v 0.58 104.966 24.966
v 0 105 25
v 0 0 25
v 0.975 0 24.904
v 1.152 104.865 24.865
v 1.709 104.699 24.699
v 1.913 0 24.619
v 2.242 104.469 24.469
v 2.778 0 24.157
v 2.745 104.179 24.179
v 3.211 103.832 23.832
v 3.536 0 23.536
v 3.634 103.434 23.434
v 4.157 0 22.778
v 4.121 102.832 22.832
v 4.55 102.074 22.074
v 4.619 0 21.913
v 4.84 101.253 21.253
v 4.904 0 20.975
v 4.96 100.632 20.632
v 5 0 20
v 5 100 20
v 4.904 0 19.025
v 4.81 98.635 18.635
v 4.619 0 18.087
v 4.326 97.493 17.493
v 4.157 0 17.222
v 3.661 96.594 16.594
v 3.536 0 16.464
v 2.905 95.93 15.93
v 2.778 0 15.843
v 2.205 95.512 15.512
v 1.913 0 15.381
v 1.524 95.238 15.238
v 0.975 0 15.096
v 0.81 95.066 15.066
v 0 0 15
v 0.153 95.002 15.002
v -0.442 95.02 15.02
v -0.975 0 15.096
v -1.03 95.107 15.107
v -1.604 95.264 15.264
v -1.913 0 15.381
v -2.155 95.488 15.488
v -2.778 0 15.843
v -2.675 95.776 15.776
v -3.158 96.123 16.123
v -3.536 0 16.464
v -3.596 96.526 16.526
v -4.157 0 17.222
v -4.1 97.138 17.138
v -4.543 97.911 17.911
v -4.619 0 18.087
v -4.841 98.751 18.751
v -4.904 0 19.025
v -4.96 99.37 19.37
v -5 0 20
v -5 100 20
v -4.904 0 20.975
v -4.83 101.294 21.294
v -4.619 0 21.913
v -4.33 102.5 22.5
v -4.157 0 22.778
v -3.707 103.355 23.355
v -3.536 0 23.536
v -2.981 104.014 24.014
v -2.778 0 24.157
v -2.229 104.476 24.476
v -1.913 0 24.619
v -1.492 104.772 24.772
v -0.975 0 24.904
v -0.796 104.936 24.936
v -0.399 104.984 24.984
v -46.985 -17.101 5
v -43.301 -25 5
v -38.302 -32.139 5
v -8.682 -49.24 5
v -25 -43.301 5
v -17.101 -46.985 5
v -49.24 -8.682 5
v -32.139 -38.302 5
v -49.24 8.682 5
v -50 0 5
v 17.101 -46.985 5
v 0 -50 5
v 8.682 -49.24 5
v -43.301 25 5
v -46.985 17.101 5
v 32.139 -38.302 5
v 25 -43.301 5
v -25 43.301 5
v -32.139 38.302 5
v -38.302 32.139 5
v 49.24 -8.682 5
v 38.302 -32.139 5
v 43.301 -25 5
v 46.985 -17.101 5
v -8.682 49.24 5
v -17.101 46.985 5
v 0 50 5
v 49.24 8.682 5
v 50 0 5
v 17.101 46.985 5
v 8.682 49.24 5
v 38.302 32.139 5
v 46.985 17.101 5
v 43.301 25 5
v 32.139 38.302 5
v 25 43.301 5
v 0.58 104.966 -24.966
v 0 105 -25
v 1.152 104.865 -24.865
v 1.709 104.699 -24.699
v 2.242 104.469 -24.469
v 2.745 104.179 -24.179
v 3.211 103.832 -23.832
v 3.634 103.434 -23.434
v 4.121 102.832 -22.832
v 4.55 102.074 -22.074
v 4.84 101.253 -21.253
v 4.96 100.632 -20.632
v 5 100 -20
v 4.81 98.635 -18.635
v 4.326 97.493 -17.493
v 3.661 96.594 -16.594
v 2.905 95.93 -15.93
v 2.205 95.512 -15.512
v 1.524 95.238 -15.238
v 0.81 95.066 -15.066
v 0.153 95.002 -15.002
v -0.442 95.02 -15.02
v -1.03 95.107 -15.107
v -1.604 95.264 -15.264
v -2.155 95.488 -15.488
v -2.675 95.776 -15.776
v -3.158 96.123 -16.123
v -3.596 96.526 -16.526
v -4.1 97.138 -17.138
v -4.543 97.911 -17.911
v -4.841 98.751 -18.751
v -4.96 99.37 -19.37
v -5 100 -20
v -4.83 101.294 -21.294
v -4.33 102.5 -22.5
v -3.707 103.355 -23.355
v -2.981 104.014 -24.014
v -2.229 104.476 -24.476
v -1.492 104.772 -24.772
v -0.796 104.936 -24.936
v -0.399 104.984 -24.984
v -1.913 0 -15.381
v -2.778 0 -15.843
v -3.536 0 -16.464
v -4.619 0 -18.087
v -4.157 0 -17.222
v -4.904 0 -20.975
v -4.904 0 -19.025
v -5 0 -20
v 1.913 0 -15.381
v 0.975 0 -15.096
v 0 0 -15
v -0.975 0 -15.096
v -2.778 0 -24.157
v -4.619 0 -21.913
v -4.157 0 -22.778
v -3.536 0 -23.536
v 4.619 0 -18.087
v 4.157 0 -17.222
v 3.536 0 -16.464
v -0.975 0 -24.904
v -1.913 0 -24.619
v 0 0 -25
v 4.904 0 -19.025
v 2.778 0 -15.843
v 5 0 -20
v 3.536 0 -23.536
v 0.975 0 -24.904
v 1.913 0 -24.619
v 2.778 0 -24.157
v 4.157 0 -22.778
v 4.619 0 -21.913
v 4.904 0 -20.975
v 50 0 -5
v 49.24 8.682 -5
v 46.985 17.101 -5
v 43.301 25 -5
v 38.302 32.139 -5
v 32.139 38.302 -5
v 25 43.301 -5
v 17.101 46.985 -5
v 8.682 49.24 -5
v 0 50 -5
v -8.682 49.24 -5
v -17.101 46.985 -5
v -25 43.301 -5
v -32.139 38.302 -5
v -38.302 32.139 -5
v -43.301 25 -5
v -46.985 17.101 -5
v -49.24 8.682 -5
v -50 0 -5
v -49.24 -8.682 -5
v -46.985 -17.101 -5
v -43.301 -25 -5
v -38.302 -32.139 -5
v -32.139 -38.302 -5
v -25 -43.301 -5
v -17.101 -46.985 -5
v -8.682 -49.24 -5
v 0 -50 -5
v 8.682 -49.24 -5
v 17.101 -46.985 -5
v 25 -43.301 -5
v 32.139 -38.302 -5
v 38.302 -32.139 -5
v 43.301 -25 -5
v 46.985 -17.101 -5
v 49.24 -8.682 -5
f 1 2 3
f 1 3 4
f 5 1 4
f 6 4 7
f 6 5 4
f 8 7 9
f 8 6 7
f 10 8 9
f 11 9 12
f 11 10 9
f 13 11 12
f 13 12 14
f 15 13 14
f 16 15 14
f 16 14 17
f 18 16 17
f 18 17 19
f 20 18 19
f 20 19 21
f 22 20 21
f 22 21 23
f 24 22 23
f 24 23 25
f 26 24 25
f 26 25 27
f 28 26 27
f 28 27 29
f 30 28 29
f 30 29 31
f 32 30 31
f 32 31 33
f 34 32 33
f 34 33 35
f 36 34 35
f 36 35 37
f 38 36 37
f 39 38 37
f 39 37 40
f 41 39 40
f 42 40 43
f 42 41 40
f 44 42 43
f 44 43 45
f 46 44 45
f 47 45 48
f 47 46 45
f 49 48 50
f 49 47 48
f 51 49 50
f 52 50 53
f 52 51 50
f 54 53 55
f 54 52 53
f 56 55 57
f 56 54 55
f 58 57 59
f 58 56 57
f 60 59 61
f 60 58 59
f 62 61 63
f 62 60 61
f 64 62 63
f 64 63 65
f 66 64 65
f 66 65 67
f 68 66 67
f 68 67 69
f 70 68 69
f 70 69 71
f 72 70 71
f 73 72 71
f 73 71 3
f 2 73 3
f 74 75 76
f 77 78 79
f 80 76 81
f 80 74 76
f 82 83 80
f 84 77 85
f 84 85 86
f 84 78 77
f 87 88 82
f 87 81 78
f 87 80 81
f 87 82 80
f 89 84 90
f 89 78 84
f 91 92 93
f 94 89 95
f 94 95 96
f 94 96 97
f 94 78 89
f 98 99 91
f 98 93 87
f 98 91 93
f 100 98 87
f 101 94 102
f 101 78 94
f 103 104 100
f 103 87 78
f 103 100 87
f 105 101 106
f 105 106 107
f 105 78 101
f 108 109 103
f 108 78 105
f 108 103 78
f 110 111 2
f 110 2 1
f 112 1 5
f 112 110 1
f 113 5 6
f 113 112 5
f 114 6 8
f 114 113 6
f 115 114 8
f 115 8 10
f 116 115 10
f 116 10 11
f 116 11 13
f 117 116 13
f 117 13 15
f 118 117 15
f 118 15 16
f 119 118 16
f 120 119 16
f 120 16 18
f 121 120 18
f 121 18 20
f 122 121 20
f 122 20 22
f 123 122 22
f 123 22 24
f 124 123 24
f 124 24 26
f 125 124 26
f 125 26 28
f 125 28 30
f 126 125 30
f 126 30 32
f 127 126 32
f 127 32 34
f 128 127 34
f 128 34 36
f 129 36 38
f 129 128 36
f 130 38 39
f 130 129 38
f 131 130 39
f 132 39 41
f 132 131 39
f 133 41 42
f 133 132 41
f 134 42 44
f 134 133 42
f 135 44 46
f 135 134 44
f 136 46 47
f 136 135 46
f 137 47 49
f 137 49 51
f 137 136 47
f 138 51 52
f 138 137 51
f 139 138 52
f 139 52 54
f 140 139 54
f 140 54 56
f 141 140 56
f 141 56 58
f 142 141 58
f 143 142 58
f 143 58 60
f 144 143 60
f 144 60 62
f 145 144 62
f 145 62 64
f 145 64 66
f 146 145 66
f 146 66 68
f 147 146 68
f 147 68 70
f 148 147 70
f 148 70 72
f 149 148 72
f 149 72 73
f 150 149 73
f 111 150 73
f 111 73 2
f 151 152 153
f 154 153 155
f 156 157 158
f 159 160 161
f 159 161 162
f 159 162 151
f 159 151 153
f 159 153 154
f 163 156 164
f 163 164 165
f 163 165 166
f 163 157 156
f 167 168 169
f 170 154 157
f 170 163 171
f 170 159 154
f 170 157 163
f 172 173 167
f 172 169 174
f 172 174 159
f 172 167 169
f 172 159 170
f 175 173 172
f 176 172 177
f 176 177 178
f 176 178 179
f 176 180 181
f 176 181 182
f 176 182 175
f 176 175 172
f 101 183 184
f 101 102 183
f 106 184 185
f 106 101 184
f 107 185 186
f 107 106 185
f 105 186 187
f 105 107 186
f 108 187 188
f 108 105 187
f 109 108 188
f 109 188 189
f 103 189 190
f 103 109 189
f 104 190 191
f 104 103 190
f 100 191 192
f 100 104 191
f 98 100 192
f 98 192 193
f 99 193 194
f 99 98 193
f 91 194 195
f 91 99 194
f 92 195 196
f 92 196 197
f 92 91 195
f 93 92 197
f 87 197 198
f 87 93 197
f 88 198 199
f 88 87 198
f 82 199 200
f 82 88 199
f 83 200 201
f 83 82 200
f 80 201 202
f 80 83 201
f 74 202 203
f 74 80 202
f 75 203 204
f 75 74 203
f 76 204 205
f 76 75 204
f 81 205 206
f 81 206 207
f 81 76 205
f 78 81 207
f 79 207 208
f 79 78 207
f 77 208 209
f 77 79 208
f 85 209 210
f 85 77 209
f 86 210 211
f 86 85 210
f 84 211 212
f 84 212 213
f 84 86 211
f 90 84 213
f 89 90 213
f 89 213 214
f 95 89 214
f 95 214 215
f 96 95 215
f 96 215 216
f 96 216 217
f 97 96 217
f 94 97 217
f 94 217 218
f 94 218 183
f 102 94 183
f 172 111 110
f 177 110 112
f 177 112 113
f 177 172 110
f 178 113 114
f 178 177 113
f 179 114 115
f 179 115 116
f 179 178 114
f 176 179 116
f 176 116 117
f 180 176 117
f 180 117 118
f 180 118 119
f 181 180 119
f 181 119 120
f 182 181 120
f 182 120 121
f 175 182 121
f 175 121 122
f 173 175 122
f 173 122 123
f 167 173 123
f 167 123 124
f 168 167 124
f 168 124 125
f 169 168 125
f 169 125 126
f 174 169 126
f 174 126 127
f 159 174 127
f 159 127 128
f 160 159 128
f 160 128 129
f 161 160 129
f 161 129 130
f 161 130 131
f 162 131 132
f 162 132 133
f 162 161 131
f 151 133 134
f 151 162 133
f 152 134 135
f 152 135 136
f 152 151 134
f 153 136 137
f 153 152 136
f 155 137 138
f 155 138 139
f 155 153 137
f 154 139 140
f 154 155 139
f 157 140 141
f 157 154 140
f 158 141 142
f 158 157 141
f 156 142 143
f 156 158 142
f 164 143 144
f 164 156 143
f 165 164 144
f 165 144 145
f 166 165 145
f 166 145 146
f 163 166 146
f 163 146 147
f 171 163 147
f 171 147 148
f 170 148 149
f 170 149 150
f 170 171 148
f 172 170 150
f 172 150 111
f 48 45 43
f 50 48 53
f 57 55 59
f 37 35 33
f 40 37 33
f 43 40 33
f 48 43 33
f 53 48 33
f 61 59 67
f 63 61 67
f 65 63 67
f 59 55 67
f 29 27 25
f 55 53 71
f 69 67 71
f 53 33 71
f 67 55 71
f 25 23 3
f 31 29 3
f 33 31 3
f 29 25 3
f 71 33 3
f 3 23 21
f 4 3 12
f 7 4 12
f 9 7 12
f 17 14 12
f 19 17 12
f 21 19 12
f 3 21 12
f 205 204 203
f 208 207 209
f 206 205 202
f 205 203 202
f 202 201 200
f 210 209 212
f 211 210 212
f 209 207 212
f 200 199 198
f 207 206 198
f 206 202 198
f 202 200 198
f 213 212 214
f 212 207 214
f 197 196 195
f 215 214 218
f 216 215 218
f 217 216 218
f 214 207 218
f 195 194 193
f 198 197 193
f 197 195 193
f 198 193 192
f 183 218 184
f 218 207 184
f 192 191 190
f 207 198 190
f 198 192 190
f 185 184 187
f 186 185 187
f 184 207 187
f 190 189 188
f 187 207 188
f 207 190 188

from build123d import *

# Parameters (mm, degrees)
SKETCH1_R           = 50
BOSS_EXTRUDE1_DEPTH = 5
SWEEP1_PROFILE_R    = 5


with BuildPart() as part:
    # Sketch1 → Boss-Extrude1 (new, symmetric)
    with BuildSketch(Plane.XY):
        Circle(SKETCH1_R)
    extrude(amount=BOSS_EXTRUDE1_DEPTH, both=True)


with BuildPart() as body_2:
    # Sweep1: sweep along a path in Sketch5
    with BuildLine(Plane(origin=(0, 0, 0), x_dir=(0, 0, -1), z_dir=(1, 0, 0))) as sweep1_path:
        Line((-20, 0), (-20, 100))
        Line((-20, 100), (20, 100))
        Line((20, 100), (20, 0))
    # Sweep1 profile (on start of the path) → Sweep1 (sweep)
    with BuildSketch(Plane(origin=(0, 0, 20), x_dir=(0, 0, 1), z_dir=(0, 1, 0))):
        Circle(SWEEP1_PROFILE_R)
    sweep(path=sweep1_path.line, transition=Transition.RIGHT)


solid = Compound([part.part, body_2.part])
